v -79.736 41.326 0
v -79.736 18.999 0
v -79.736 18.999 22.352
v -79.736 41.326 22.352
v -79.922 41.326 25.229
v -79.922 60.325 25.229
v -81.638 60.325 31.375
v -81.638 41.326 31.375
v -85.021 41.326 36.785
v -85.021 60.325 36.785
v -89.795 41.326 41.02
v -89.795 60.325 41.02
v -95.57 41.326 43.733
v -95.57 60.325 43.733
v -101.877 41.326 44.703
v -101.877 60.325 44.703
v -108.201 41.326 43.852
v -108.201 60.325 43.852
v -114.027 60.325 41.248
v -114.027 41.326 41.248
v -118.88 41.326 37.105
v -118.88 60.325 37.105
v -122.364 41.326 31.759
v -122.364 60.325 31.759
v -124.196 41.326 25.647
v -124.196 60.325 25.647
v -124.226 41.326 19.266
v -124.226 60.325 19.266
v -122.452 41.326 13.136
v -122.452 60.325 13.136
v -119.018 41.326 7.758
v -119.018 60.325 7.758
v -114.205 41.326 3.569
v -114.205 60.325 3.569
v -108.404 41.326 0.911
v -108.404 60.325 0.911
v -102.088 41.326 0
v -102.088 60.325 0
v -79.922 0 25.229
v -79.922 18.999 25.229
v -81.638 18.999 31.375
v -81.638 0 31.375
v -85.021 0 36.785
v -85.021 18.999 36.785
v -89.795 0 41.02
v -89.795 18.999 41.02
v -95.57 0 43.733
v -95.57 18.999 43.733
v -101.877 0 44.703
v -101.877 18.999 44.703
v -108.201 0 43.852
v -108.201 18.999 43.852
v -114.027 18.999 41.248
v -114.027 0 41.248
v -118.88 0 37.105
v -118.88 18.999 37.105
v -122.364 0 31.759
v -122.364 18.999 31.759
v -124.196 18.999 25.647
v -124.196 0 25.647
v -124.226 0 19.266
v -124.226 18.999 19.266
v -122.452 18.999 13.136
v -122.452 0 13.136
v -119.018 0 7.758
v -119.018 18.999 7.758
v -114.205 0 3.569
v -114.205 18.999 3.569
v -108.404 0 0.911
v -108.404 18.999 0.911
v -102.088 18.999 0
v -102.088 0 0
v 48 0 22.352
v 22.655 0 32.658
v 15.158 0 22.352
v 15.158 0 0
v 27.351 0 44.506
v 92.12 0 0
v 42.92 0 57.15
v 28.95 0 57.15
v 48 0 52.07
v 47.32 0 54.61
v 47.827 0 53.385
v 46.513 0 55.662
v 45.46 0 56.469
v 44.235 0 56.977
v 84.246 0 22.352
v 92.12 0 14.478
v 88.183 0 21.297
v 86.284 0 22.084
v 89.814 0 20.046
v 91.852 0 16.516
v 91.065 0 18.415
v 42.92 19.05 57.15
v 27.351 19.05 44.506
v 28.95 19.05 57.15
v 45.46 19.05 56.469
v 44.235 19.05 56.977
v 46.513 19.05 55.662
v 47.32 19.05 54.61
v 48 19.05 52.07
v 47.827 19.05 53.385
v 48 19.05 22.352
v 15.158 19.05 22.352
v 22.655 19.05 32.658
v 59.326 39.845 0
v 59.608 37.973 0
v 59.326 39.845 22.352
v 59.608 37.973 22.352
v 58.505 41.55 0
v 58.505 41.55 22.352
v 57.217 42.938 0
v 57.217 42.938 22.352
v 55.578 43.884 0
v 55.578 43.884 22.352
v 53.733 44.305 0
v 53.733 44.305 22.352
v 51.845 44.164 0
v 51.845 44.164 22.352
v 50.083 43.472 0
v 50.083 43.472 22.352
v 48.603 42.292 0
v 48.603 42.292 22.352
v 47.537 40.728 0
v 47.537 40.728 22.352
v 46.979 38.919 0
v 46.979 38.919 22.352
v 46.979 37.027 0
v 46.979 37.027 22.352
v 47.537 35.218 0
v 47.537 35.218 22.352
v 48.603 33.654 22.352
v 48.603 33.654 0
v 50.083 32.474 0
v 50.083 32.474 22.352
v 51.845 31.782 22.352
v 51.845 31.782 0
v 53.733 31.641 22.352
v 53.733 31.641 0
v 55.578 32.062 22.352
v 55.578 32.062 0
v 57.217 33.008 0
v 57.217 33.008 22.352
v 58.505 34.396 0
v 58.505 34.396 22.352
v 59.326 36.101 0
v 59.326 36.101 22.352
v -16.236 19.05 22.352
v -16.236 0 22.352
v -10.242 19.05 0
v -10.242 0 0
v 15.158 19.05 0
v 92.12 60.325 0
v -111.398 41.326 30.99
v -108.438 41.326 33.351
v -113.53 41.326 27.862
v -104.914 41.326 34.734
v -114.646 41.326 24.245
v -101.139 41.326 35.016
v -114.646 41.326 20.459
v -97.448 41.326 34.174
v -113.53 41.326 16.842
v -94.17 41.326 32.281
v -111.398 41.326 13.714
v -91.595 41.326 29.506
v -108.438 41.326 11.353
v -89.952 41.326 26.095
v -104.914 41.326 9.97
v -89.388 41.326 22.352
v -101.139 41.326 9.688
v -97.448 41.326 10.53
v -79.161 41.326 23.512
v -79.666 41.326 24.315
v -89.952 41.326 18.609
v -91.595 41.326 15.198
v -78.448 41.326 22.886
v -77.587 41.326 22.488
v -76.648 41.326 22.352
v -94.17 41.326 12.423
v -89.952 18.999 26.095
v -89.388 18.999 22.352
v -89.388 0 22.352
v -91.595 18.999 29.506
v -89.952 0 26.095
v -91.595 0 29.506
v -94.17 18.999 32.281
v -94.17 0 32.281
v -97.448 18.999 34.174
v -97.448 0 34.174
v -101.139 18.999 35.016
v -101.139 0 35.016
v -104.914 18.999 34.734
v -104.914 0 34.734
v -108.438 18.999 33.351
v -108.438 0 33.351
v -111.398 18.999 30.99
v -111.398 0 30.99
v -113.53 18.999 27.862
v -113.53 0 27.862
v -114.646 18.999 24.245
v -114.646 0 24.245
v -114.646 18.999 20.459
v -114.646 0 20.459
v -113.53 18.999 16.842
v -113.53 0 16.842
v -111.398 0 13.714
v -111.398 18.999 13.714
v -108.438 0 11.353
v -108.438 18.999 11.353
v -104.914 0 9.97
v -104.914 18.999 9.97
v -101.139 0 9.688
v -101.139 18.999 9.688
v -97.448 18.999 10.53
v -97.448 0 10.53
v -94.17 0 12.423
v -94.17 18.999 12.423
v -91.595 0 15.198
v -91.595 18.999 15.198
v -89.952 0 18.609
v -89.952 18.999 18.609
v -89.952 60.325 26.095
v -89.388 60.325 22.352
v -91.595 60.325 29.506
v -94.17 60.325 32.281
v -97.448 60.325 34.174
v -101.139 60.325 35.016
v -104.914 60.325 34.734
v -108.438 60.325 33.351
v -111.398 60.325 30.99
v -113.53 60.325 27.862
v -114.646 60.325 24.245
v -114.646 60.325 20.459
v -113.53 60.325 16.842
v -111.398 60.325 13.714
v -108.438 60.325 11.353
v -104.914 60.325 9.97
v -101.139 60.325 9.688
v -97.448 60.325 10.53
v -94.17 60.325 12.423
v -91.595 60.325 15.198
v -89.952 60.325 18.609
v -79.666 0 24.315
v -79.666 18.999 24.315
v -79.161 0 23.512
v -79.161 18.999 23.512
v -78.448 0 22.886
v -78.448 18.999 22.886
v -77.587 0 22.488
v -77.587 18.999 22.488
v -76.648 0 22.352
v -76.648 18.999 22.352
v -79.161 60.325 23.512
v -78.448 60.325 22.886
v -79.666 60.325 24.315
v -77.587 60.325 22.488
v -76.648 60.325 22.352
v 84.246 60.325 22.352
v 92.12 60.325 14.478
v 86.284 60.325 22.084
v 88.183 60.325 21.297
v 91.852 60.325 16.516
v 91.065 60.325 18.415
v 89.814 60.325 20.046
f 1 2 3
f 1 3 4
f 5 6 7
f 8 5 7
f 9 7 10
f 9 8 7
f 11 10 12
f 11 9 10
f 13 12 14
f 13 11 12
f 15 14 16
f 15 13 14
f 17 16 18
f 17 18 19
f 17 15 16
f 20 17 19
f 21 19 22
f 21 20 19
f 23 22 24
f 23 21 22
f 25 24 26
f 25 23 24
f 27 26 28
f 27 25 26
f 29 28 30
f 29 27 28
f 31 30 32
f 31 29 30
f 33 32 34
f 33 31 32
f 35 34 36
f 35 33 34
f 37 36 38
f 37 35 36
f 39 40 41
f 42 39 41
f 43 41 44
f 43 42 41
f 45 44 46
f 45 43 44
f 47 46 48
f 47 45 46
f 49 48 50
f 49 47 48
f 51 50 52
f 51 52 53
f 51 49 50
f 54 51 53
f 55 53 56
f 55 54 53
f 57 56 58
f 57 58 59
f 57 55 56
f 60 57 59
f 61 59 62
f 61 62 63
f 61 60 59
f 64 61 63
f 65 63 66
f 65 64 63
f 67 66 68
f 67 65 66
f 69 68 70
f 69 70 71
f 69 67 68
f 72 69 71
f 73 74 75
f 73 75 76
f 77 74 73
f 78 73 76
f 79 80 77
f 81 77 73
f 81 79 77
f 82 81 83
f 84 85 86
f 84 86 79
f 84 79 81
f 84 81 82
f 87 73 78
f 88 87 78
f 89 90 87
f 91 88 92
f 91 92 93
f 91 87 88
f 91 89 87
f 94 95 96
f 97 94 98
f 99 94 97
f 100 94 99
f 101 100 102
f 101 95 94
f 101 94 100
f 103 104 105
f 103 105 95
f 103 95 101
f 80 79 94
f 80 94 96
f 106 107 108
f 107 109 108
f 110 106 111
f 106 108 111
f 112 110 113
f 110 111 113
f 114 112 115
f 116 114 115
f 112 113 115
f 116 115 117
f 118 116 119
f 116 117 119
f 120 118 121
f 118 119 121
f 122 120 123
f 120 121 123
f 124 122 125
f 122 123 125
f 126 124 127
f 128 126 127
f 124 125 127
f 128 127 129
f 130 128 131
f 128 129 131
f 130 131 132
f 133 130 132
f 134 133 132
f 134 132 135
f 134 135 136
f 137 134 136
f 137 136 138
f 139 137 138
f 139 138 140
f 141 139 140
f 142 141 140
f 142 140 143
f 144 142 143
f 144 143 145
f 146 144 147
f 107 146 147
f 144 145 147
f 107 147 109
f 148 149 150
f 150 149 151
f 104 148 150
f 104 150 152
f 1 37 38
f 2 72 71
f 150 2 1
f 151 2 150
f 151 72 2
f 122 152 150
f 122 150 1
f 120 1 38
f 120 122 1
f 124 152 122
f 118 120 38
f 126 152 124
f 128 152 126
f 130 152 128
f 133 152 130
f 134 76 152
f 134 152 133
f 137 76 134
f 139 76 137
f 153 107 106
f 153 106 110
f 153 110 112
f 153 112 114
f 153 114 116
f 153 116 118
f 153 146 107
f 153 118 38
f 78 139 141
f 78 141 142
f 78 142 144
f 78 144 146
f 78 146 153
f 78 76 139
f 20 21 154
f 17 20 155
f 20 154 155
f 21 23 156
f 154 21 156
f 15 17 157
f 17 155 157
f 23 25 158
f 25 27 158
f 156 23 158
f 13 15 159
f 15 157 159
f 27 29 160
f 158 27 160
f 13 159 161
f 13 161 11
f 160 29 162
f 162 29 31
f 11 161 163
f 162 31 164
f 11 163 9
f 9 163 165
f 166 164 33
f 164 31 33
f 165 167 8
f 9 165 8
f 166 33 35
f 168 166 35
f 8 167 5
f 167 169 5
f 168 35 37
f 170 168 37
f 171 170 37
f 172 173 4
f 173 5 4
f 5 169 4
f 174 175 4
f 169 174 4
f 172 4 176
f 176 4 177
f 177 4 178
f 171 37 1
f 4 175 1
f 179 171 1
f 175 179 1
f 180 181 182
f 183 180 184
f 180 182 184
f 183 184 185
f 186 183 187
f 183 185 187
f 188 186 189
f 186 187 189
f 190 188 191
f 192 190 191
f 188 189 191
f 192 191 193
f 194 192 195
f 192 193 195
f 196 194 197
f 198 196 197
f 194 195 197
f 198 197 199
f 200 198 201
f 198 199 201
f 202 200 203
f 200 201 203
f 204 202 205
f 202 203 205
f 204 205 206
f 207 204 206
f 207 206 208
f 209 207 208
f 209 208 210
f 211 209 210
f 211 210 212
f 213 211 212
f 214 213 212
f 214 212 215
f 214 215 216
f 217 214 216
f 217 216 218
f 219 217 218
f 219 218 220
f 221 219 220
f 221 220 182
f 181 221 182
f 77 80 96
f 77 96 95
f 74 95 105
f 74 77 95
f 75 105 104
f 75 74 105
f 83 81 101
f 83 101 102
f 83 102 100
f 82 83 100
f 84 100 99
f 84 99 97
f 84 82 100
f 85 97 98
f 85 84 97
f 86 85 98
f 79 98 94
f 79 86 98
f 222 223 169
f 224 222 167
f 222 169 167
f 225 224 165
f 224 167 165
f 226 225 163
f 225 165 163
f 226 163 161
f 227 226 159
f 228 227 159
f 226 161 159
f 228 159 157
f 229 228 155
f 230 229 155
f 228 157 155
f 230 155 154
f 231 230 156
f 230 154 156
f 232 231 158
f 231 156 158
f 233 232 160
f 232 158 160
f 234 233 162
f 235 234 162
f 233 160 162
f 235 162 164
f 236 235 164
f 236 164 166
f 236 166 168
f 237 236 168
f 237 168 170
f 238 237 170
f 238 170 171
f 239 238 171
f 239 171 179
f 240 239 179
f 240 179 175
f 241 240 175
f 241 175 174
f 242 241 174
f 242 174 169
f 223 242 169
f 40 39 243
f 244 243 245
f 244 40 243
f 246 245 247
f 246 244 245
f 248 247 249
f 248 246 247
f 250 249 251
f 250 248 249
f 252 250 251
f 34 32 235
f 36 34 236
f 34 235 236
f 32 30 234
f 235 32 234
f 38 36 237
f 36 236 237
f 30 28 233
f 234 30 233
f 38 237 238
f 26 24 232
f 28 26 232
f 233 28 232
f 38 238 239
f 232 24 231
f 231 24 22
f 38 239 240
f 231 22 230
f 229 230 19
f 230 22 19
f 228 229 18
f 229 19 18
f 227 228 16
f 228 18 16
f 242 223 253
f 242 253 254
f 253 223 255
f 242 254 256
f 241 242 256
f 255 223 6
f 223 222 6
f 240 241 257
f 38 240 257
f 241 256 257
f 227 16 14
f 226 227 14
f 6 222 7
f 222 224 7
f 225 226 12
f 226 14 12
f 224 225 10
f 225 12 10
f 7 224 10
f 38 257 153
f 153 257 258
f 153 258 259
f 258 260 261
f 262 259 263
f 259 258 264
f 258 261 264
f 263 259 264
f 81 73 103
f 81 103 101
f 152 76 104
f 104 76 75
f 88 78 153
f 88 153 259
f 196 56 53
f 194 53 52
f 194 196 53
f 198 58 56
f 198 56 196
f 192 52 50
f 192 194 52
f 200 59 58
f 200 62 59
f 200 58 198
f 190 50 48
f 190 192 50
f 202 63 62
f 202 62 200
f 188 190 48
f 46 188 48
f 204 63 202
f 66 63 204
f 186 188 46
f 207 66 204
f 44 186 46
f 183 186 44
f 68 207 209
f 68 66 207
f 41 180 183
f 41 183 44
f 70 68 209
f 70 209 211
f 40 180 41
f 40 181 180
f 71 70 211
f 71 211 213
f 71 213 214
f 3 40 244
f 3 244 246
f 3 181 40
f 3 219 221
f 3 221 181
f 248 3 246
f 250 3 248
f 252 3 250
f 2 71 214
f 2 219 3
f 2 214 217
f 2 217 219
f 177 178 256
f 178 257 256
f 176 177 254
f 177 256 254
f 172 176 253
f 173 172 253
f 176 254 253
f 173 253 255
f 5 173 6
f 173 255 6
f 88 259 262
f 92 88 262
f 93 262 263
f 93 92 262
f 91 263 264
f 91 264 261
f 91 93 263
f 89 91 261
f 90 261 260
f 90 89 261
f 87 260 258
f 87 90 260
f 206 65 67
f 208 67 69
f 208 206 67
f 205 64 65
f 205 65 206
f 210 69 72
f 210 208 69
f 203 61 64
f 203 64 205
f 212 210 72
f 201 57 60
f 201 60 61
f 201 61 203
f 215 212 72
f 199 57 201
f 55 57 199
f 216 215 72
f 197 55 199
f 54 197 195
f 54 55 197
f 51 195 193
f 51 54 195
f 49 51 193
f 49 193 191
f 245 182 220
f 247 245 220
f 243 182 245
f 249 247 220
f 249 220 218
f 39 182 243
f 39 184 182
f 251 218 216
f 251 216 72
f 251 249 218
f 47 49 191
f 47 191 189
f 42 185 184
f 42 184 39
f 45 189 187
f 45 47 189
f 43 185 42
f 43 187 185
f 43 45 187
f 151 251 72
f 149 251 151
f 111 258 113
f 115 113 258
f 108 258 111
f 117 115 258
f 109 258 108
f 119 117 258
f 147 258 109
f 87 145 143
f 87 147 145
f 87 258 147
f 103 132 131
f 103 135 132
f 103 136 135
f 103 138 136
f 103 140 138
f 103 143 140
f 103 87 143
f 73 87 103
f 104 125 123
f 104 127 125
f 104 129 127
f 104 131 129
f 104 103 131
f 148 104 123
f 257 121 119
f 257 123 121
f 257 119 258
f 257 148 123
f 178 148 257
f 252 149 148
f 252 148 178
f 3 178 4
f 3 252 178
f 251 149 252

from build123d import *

# Parameters (mm, degrees)
F0_R     = 12.7
F1_DEPTH = 60.325
F3_W     = 32.8422
F3_H     = 41.275
F6_DEPTH = 34.798
F7_DEPTH = 19.05
F5_W     = 50.4518977821
F5_H     = 22.3266
F5_R     = 6.35
F8_DEPTH = 47.498
F9_R     = 3.302


with BuildPart() as f1:
    # F0 (on Front) → F1 (new body)
    with BuildSketch(Plane.XZ):
        with BuildLine():
            ThreePointArc((-79.7361564685, 22.352), (-117.8934072416, 38.1572507731), (-102.0881564685, 0))
            Line((-102.0881564685, 0), (92.1202435315, 0))
            Line((92.1202435315, 0), (92.1202435315, 14.478))
            ThreePointArc((92.1202435315, 14.478), (89.8140023266, 20.0457587951), (84.2462435315, 22.352))
            Line((84.2462435315, 22.352), (48.0004435315, 22.352))
            Line((48.0004435315, 22.352), (48.0004435315, 52.07))
            ThreePointArc((48.0004435315, 52.07), (46.5125459799, 55.6621024484), (42.9204435315, 57.15))
            Line((42.9204435315, 57.15), (28.9504435315, 57.15))
            ThreePointArc((28.9504435315, 57.15), (25.3762588931, 38.4343576341), (15.1582435315, 22.352))
            Line((15.1582435315, 22.352), (-79.7361564685, 22.352))
        make_face()
        with Locations((-102.0881564685, 22.352)):
            Circle(F0_R, mode=Mode.SUBTRACT)
    extrude(amount=-F1_DEPTH)

    # F3 (on offset) → F6 (cut, through all)
    with BuildSketch(Plane.XY.offset(22.352)):
        with Locations((31.5793435315, 39.6875)):
            Rectangle(F3_W, F3_H)
    extrude(amount=F6_DEPTH, mode=Mode.SUBTRACT)

    # F4 (on Front) → F7 (cut)
    with BuildSketch(Plane.XZ):
        Polygon((15.1582435315, 0), (15.1582435315, 22.352), (-16.2361564685, 22.352), (-10.2417564685, 0), align=None)
    extrude(amount=-F7_DEPTH, mode=Mode.SUBTRACT)

    # F5 (on offset) → F8 (cut, symmetric)
    with BuildSketch(Plane.XY.offset(22.352)):
        with Locations((-104.9621053595, 30.1625)):
            Rectangle(F5_W, F5_H)
        with Locations((53.2582435315, 37.973)):
            Circle(F5_R)
    extrude(amount=F8_DEPTH, both=True, mode=Mode.SUBTRACT)

    # F9
    f9_edges = [f1.edges().sort_by_distance(p)[0] for p in [
        (-79.736156, 9.4996, 22.352),
        (-79.736156, 50.8254, 22.352),
    ]]
    fillet(f9_edges, radius=F9_R)


solid = f1.part
